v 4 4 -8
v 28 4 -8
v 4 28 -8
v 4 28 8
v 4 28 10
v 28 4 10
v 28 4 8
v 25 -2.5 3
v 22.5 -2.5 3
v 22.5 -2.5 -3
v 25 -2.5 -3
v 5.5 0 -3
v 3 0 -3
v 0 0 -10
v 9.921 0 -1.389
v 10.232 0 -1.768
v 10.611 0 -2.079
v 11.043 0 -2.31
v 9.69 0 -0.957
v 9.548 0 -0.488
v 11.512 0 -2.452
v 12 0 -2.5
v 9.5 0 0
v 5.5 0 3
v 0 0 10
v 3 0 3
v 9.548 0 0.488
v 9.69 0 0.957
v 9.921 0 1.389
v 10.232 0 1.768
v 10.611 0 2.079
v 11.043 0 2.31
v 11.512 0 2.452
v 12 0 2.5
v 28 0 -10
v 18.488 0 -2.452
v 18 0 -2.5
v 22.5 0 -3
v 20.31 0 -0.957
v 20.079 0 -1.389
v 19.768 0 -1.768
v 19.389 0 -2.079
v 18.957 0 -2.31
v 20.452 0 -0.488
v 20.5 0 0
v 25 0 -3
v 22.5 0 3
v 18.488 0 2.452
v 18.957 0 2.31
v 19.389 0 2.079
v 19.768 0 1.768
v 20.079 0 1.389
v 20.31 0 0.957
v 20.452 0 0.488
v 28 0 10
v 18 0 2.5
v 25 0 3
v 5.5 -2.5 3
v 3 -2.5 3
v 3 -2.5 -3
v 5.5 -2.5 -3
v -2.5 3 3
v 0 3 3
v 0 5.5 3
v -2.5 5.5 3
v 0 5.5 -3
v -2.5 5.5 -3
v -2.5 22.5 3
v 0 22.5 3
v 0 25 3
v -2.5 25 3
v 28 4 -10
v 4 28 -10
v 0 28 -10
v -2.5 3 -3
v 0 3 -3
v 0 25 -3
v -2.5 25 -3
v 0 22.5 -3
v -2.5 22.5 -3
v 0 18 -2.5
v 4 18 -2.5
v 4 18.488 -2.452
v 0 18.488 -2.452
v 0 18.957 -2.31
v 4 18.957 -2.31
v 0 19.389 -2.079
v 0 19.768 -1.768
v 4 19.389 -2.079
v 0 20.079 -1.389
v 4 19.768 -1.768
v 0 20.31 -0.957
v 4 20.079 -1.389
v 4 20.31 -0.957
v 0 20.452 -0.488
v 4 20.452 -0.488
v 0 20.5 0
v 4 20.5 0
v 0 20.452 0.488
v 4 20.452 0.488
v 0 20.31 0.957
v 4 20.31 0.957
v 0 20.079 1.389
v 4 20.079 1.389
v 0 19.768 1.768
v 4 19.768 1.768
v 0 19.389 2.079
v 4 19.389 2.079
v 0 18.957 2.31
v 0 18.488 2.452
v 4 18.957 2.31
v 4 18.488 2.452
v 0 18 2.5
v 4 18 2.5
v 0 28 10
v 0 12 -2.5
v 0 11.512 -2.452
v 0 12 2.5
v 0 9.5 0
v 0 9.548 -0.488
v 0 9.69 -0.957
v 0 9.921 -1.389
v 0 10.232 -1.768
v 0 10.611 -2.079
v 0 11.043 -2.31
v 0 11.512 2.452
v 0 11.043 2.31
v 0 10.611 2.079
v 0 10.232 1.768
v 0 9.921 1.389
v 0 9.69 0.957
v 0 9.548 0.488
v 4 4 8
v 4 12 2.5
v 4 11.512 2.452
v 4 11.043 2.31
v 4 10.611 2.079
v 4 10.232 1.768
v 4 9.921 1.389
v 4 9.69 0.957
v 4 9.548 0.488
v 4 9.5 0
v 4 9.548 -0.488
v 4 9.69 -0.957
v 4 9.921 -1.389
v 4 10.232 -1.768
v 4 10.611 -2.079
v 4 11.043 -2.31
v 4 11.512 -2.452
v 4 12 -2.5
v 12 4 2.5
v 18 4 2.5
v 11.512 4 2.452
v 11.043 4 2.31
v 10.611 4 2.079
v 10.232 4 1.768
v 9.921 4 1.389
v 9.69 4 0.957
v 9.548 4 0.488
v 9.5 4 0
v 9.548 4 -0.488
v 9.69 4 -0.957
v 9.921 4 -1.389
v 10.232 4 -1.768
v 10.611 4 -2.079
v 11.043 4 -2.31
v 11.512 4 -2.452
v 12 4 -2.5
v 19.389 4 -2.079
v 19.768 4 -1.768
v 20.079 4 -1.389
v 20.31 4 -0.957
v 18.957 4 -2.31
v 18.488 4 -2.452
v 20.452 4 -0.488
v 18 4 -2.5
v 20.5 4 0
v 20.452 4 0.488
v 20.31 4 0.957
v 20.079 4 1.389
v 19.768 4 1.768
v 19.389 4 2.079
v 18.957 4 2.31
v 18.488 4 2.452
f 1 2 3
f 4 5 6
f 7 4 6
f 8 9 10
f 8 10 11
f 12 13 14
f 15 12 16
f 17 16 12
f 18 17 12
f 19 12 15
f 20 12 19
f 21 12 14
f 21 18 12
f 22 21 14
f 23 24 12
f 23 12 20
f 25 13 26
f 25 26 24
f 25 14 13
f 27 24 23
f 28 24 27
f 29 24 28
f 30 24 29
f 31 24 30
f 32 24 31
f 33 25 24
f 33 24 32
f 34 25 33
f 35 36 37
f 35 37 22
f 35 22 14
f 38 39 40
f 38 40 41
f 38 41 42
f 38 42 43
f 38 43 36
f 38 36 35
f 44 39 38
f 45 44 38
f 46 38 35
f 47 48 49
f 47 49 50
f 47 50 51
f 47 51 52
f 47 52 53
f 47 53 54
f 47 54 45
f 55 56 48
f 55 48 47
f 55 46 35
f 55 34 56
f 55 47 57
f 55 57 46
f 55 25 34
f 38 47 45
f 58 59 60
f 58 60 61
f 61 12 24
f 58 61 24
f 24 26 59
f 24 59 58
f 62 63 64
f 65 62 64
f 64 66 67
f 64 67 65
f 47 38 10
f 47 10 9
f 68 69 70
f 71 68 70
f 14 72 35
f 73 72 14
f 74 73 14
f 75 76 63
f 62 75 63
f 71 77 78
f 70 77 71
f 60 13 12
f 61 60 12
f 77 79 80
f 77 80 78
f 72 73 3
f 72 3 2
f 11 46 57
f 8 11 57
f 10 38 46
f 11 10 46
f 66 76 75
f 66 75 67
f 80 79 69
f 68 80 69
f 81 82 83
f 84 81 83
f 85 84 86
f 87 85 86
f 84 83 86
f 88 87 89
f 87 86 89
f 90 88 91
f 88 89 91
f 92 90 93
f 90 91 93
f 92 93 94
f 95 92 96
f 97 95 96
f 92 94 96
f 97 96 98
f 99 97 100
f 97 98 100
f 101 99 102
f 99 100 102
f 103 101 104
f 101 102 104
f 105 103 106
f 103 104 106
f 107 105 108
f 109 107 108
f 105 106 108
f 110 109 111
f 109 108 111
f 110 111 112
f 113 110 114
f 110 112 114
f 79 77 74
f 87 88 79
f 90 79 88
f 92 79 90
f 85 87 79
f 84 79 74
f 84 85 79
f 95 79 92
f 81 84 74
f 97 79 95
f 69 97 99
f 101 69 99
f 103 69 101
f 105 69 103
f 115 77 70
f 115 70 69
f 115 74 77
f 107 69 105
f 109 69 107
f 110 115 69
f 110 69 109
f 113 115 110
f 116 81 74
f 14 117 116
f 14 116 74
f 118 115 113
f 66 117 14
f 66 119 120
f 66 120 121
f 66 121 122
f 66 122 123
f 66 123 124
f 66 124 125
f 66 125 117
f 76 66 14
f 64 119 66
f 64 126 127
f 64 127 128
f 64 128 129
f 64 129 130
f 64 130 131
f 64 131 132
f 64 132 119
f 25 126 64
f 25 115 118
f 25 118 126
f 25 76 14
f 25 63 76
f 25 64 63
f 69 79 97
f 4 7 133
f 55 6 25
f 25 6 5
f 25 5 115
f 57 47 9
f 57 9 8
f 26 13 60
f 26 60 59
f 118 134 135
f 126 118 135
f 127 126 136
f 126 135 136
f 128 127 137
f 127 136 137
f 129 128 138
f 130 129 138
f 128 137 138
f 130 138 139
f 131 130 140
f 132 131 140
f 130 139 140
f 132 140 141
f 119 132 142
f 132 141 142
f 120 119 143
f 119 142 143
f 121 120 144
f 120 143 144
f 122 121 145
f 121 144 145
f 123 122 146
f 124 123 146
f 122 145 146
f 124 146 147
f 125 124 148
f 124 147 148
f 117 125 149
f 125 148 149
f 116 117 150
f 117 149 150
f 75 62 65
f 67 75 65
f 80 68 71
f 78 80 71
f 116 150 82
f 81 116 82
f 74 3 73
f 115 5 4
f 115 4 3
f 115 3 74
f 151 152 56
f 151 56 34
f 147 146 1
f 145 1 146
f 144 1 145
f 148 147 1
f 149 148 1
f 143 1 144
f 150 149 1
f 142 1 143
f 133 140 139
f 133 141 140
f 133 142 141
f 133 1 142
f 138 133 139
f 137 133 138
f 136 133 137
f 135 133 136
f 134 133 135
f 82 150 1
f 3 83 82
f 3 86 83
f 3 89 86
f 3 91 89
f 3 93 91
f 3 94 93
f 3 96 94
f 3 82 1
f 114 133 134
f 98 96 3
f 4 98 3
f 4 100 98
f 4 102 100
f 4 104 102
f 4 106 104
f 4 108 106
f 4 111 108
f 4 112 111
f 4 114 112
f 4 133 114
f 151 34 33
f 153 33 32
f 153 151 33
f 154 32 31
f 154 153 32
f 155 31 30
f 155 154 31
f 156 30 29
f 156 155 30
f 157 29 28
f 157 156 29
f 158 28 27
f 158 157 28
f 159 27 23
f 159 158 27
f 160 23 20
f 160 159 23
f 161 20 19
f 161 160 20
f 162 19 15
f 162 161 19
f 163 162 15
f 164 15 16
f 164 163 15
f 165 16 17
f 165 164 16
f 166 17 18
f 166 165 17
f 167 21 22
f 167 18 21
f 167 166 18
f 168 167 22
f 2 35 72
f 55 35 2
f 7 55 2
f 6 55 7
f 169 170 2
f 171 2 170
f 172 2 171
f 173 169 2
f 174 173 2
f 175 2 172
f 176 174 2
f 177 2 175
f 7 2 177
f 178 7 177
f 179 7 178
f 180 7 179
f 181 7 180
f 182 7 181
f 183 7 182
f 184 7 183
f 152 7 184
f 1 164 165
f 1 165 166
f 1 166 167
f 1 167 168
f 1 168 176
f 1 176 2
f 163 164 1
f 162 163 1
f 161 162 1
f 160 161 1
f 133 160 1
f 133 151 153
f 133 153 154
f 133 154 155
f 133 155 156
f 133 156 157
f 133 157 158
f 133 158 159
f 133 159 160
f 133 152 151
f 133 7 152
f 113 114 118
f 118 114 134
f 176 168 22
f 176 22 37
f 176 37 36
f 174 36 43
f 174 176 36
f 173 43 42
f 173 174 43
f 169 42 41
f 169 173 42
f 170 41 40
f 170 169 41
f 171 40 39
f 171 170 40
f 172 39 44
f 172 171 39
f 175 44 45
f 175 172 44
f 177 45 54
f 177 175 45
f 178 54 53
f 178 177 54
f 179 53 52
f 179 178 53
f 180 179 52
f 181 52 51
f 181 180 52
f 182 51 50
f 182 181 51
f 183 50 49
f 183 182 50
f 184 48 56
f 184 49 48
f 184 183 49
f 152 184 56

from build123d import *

# Parameters (mm, degrees)
EXTRUDE_1_DEPTH     = 10
EXTRUDE_2_DEPTH     = 2
CUT_EXTRUDE_1_DEPTH = 5
SKETCH_4_W          = 2.5
SKETCH_4_H          = 6
EXTRUDE_3_DEPTH     = 2.5


with BuildPart() as part:
    # Эскиз1 → Бобышка-Вытянуть1 (new body, symmetric)
    with BuildSketch(Plane.XY):
        Polygon((0, 28), (0, 0), (28, 0), (28, 4), (4, 4), (4, 28), align=None)
    extrude(amount=EXTRUDE_1_DEPTH, both=True)

    # Эскиз2 → Бобышка-Вытянуть2 (add)
    with BuildSketch(Plane.XY.offset(10)):
        Polygon((4, 28), (28, 4), (4, 4), align=None)
    extrude_2 = extrude(amount=-EXTRUDE_2_DEPTH)

    # Зеркальное отражение2: Бобышка-Вытянуть2 across plane
    add(extrude_2.mirror(Plane.XY))

    # Эскиз3 → Вырез-Вытянуть1 (cut, through all)
    with BuildSketch(Plane(origin=(0, 4, 0), x_dir=(1, 0, 0), z_dir=(0, 1, 0))):
        with BuildLine():
            Line((12, 2.5), (18, 2.5))
            ThreePointArc((18, 2.5), (20.5, 0), (18, -2.5))
            Line((18, -2.5), (12, -2.5))
            ThreePointArc((12, -2.5), (9.5, 0), (12, 2.5))
        make_face()
    cut_extrude_1 = extrude(amount=-CUT_EXTRUDE_1_DEPTH, mode=Mode.SUBTRACT)

    # Эскиз4 → Бобышка-Вытянуть3 (add)
    with BuildSketch(Plane.XZ):
        with Locations((4.25, 0)):
            Rectangle(SKETCH_4_W, SKETCH_4_H)
        with Locations((23.75, 0)):
            Rectangle(SKETCH_4_W, SKETCH_4_H)
    extrude_3 = extrude(amount=EXTRUDE_3_DEPTH)

    # Зеркальное отражение3: Вырез-Вытянуть1, Бобышка-Вытянуть3 across plane
    add(cut_extrude_1.mirror(Plane(origin=(0, 0, 0), x_dir=(0, 0, 1), z_dir=(-0.707106781, 0.707106781, 0))), mode=Mode.SUBTRACT)
    add(extrude_3.mirror(Plane(origin=(0, 0, 0), x_dir=(0, 0, 1), z_dir=(-0.707106781, 0.707106781, 0))))


solid = part.part
